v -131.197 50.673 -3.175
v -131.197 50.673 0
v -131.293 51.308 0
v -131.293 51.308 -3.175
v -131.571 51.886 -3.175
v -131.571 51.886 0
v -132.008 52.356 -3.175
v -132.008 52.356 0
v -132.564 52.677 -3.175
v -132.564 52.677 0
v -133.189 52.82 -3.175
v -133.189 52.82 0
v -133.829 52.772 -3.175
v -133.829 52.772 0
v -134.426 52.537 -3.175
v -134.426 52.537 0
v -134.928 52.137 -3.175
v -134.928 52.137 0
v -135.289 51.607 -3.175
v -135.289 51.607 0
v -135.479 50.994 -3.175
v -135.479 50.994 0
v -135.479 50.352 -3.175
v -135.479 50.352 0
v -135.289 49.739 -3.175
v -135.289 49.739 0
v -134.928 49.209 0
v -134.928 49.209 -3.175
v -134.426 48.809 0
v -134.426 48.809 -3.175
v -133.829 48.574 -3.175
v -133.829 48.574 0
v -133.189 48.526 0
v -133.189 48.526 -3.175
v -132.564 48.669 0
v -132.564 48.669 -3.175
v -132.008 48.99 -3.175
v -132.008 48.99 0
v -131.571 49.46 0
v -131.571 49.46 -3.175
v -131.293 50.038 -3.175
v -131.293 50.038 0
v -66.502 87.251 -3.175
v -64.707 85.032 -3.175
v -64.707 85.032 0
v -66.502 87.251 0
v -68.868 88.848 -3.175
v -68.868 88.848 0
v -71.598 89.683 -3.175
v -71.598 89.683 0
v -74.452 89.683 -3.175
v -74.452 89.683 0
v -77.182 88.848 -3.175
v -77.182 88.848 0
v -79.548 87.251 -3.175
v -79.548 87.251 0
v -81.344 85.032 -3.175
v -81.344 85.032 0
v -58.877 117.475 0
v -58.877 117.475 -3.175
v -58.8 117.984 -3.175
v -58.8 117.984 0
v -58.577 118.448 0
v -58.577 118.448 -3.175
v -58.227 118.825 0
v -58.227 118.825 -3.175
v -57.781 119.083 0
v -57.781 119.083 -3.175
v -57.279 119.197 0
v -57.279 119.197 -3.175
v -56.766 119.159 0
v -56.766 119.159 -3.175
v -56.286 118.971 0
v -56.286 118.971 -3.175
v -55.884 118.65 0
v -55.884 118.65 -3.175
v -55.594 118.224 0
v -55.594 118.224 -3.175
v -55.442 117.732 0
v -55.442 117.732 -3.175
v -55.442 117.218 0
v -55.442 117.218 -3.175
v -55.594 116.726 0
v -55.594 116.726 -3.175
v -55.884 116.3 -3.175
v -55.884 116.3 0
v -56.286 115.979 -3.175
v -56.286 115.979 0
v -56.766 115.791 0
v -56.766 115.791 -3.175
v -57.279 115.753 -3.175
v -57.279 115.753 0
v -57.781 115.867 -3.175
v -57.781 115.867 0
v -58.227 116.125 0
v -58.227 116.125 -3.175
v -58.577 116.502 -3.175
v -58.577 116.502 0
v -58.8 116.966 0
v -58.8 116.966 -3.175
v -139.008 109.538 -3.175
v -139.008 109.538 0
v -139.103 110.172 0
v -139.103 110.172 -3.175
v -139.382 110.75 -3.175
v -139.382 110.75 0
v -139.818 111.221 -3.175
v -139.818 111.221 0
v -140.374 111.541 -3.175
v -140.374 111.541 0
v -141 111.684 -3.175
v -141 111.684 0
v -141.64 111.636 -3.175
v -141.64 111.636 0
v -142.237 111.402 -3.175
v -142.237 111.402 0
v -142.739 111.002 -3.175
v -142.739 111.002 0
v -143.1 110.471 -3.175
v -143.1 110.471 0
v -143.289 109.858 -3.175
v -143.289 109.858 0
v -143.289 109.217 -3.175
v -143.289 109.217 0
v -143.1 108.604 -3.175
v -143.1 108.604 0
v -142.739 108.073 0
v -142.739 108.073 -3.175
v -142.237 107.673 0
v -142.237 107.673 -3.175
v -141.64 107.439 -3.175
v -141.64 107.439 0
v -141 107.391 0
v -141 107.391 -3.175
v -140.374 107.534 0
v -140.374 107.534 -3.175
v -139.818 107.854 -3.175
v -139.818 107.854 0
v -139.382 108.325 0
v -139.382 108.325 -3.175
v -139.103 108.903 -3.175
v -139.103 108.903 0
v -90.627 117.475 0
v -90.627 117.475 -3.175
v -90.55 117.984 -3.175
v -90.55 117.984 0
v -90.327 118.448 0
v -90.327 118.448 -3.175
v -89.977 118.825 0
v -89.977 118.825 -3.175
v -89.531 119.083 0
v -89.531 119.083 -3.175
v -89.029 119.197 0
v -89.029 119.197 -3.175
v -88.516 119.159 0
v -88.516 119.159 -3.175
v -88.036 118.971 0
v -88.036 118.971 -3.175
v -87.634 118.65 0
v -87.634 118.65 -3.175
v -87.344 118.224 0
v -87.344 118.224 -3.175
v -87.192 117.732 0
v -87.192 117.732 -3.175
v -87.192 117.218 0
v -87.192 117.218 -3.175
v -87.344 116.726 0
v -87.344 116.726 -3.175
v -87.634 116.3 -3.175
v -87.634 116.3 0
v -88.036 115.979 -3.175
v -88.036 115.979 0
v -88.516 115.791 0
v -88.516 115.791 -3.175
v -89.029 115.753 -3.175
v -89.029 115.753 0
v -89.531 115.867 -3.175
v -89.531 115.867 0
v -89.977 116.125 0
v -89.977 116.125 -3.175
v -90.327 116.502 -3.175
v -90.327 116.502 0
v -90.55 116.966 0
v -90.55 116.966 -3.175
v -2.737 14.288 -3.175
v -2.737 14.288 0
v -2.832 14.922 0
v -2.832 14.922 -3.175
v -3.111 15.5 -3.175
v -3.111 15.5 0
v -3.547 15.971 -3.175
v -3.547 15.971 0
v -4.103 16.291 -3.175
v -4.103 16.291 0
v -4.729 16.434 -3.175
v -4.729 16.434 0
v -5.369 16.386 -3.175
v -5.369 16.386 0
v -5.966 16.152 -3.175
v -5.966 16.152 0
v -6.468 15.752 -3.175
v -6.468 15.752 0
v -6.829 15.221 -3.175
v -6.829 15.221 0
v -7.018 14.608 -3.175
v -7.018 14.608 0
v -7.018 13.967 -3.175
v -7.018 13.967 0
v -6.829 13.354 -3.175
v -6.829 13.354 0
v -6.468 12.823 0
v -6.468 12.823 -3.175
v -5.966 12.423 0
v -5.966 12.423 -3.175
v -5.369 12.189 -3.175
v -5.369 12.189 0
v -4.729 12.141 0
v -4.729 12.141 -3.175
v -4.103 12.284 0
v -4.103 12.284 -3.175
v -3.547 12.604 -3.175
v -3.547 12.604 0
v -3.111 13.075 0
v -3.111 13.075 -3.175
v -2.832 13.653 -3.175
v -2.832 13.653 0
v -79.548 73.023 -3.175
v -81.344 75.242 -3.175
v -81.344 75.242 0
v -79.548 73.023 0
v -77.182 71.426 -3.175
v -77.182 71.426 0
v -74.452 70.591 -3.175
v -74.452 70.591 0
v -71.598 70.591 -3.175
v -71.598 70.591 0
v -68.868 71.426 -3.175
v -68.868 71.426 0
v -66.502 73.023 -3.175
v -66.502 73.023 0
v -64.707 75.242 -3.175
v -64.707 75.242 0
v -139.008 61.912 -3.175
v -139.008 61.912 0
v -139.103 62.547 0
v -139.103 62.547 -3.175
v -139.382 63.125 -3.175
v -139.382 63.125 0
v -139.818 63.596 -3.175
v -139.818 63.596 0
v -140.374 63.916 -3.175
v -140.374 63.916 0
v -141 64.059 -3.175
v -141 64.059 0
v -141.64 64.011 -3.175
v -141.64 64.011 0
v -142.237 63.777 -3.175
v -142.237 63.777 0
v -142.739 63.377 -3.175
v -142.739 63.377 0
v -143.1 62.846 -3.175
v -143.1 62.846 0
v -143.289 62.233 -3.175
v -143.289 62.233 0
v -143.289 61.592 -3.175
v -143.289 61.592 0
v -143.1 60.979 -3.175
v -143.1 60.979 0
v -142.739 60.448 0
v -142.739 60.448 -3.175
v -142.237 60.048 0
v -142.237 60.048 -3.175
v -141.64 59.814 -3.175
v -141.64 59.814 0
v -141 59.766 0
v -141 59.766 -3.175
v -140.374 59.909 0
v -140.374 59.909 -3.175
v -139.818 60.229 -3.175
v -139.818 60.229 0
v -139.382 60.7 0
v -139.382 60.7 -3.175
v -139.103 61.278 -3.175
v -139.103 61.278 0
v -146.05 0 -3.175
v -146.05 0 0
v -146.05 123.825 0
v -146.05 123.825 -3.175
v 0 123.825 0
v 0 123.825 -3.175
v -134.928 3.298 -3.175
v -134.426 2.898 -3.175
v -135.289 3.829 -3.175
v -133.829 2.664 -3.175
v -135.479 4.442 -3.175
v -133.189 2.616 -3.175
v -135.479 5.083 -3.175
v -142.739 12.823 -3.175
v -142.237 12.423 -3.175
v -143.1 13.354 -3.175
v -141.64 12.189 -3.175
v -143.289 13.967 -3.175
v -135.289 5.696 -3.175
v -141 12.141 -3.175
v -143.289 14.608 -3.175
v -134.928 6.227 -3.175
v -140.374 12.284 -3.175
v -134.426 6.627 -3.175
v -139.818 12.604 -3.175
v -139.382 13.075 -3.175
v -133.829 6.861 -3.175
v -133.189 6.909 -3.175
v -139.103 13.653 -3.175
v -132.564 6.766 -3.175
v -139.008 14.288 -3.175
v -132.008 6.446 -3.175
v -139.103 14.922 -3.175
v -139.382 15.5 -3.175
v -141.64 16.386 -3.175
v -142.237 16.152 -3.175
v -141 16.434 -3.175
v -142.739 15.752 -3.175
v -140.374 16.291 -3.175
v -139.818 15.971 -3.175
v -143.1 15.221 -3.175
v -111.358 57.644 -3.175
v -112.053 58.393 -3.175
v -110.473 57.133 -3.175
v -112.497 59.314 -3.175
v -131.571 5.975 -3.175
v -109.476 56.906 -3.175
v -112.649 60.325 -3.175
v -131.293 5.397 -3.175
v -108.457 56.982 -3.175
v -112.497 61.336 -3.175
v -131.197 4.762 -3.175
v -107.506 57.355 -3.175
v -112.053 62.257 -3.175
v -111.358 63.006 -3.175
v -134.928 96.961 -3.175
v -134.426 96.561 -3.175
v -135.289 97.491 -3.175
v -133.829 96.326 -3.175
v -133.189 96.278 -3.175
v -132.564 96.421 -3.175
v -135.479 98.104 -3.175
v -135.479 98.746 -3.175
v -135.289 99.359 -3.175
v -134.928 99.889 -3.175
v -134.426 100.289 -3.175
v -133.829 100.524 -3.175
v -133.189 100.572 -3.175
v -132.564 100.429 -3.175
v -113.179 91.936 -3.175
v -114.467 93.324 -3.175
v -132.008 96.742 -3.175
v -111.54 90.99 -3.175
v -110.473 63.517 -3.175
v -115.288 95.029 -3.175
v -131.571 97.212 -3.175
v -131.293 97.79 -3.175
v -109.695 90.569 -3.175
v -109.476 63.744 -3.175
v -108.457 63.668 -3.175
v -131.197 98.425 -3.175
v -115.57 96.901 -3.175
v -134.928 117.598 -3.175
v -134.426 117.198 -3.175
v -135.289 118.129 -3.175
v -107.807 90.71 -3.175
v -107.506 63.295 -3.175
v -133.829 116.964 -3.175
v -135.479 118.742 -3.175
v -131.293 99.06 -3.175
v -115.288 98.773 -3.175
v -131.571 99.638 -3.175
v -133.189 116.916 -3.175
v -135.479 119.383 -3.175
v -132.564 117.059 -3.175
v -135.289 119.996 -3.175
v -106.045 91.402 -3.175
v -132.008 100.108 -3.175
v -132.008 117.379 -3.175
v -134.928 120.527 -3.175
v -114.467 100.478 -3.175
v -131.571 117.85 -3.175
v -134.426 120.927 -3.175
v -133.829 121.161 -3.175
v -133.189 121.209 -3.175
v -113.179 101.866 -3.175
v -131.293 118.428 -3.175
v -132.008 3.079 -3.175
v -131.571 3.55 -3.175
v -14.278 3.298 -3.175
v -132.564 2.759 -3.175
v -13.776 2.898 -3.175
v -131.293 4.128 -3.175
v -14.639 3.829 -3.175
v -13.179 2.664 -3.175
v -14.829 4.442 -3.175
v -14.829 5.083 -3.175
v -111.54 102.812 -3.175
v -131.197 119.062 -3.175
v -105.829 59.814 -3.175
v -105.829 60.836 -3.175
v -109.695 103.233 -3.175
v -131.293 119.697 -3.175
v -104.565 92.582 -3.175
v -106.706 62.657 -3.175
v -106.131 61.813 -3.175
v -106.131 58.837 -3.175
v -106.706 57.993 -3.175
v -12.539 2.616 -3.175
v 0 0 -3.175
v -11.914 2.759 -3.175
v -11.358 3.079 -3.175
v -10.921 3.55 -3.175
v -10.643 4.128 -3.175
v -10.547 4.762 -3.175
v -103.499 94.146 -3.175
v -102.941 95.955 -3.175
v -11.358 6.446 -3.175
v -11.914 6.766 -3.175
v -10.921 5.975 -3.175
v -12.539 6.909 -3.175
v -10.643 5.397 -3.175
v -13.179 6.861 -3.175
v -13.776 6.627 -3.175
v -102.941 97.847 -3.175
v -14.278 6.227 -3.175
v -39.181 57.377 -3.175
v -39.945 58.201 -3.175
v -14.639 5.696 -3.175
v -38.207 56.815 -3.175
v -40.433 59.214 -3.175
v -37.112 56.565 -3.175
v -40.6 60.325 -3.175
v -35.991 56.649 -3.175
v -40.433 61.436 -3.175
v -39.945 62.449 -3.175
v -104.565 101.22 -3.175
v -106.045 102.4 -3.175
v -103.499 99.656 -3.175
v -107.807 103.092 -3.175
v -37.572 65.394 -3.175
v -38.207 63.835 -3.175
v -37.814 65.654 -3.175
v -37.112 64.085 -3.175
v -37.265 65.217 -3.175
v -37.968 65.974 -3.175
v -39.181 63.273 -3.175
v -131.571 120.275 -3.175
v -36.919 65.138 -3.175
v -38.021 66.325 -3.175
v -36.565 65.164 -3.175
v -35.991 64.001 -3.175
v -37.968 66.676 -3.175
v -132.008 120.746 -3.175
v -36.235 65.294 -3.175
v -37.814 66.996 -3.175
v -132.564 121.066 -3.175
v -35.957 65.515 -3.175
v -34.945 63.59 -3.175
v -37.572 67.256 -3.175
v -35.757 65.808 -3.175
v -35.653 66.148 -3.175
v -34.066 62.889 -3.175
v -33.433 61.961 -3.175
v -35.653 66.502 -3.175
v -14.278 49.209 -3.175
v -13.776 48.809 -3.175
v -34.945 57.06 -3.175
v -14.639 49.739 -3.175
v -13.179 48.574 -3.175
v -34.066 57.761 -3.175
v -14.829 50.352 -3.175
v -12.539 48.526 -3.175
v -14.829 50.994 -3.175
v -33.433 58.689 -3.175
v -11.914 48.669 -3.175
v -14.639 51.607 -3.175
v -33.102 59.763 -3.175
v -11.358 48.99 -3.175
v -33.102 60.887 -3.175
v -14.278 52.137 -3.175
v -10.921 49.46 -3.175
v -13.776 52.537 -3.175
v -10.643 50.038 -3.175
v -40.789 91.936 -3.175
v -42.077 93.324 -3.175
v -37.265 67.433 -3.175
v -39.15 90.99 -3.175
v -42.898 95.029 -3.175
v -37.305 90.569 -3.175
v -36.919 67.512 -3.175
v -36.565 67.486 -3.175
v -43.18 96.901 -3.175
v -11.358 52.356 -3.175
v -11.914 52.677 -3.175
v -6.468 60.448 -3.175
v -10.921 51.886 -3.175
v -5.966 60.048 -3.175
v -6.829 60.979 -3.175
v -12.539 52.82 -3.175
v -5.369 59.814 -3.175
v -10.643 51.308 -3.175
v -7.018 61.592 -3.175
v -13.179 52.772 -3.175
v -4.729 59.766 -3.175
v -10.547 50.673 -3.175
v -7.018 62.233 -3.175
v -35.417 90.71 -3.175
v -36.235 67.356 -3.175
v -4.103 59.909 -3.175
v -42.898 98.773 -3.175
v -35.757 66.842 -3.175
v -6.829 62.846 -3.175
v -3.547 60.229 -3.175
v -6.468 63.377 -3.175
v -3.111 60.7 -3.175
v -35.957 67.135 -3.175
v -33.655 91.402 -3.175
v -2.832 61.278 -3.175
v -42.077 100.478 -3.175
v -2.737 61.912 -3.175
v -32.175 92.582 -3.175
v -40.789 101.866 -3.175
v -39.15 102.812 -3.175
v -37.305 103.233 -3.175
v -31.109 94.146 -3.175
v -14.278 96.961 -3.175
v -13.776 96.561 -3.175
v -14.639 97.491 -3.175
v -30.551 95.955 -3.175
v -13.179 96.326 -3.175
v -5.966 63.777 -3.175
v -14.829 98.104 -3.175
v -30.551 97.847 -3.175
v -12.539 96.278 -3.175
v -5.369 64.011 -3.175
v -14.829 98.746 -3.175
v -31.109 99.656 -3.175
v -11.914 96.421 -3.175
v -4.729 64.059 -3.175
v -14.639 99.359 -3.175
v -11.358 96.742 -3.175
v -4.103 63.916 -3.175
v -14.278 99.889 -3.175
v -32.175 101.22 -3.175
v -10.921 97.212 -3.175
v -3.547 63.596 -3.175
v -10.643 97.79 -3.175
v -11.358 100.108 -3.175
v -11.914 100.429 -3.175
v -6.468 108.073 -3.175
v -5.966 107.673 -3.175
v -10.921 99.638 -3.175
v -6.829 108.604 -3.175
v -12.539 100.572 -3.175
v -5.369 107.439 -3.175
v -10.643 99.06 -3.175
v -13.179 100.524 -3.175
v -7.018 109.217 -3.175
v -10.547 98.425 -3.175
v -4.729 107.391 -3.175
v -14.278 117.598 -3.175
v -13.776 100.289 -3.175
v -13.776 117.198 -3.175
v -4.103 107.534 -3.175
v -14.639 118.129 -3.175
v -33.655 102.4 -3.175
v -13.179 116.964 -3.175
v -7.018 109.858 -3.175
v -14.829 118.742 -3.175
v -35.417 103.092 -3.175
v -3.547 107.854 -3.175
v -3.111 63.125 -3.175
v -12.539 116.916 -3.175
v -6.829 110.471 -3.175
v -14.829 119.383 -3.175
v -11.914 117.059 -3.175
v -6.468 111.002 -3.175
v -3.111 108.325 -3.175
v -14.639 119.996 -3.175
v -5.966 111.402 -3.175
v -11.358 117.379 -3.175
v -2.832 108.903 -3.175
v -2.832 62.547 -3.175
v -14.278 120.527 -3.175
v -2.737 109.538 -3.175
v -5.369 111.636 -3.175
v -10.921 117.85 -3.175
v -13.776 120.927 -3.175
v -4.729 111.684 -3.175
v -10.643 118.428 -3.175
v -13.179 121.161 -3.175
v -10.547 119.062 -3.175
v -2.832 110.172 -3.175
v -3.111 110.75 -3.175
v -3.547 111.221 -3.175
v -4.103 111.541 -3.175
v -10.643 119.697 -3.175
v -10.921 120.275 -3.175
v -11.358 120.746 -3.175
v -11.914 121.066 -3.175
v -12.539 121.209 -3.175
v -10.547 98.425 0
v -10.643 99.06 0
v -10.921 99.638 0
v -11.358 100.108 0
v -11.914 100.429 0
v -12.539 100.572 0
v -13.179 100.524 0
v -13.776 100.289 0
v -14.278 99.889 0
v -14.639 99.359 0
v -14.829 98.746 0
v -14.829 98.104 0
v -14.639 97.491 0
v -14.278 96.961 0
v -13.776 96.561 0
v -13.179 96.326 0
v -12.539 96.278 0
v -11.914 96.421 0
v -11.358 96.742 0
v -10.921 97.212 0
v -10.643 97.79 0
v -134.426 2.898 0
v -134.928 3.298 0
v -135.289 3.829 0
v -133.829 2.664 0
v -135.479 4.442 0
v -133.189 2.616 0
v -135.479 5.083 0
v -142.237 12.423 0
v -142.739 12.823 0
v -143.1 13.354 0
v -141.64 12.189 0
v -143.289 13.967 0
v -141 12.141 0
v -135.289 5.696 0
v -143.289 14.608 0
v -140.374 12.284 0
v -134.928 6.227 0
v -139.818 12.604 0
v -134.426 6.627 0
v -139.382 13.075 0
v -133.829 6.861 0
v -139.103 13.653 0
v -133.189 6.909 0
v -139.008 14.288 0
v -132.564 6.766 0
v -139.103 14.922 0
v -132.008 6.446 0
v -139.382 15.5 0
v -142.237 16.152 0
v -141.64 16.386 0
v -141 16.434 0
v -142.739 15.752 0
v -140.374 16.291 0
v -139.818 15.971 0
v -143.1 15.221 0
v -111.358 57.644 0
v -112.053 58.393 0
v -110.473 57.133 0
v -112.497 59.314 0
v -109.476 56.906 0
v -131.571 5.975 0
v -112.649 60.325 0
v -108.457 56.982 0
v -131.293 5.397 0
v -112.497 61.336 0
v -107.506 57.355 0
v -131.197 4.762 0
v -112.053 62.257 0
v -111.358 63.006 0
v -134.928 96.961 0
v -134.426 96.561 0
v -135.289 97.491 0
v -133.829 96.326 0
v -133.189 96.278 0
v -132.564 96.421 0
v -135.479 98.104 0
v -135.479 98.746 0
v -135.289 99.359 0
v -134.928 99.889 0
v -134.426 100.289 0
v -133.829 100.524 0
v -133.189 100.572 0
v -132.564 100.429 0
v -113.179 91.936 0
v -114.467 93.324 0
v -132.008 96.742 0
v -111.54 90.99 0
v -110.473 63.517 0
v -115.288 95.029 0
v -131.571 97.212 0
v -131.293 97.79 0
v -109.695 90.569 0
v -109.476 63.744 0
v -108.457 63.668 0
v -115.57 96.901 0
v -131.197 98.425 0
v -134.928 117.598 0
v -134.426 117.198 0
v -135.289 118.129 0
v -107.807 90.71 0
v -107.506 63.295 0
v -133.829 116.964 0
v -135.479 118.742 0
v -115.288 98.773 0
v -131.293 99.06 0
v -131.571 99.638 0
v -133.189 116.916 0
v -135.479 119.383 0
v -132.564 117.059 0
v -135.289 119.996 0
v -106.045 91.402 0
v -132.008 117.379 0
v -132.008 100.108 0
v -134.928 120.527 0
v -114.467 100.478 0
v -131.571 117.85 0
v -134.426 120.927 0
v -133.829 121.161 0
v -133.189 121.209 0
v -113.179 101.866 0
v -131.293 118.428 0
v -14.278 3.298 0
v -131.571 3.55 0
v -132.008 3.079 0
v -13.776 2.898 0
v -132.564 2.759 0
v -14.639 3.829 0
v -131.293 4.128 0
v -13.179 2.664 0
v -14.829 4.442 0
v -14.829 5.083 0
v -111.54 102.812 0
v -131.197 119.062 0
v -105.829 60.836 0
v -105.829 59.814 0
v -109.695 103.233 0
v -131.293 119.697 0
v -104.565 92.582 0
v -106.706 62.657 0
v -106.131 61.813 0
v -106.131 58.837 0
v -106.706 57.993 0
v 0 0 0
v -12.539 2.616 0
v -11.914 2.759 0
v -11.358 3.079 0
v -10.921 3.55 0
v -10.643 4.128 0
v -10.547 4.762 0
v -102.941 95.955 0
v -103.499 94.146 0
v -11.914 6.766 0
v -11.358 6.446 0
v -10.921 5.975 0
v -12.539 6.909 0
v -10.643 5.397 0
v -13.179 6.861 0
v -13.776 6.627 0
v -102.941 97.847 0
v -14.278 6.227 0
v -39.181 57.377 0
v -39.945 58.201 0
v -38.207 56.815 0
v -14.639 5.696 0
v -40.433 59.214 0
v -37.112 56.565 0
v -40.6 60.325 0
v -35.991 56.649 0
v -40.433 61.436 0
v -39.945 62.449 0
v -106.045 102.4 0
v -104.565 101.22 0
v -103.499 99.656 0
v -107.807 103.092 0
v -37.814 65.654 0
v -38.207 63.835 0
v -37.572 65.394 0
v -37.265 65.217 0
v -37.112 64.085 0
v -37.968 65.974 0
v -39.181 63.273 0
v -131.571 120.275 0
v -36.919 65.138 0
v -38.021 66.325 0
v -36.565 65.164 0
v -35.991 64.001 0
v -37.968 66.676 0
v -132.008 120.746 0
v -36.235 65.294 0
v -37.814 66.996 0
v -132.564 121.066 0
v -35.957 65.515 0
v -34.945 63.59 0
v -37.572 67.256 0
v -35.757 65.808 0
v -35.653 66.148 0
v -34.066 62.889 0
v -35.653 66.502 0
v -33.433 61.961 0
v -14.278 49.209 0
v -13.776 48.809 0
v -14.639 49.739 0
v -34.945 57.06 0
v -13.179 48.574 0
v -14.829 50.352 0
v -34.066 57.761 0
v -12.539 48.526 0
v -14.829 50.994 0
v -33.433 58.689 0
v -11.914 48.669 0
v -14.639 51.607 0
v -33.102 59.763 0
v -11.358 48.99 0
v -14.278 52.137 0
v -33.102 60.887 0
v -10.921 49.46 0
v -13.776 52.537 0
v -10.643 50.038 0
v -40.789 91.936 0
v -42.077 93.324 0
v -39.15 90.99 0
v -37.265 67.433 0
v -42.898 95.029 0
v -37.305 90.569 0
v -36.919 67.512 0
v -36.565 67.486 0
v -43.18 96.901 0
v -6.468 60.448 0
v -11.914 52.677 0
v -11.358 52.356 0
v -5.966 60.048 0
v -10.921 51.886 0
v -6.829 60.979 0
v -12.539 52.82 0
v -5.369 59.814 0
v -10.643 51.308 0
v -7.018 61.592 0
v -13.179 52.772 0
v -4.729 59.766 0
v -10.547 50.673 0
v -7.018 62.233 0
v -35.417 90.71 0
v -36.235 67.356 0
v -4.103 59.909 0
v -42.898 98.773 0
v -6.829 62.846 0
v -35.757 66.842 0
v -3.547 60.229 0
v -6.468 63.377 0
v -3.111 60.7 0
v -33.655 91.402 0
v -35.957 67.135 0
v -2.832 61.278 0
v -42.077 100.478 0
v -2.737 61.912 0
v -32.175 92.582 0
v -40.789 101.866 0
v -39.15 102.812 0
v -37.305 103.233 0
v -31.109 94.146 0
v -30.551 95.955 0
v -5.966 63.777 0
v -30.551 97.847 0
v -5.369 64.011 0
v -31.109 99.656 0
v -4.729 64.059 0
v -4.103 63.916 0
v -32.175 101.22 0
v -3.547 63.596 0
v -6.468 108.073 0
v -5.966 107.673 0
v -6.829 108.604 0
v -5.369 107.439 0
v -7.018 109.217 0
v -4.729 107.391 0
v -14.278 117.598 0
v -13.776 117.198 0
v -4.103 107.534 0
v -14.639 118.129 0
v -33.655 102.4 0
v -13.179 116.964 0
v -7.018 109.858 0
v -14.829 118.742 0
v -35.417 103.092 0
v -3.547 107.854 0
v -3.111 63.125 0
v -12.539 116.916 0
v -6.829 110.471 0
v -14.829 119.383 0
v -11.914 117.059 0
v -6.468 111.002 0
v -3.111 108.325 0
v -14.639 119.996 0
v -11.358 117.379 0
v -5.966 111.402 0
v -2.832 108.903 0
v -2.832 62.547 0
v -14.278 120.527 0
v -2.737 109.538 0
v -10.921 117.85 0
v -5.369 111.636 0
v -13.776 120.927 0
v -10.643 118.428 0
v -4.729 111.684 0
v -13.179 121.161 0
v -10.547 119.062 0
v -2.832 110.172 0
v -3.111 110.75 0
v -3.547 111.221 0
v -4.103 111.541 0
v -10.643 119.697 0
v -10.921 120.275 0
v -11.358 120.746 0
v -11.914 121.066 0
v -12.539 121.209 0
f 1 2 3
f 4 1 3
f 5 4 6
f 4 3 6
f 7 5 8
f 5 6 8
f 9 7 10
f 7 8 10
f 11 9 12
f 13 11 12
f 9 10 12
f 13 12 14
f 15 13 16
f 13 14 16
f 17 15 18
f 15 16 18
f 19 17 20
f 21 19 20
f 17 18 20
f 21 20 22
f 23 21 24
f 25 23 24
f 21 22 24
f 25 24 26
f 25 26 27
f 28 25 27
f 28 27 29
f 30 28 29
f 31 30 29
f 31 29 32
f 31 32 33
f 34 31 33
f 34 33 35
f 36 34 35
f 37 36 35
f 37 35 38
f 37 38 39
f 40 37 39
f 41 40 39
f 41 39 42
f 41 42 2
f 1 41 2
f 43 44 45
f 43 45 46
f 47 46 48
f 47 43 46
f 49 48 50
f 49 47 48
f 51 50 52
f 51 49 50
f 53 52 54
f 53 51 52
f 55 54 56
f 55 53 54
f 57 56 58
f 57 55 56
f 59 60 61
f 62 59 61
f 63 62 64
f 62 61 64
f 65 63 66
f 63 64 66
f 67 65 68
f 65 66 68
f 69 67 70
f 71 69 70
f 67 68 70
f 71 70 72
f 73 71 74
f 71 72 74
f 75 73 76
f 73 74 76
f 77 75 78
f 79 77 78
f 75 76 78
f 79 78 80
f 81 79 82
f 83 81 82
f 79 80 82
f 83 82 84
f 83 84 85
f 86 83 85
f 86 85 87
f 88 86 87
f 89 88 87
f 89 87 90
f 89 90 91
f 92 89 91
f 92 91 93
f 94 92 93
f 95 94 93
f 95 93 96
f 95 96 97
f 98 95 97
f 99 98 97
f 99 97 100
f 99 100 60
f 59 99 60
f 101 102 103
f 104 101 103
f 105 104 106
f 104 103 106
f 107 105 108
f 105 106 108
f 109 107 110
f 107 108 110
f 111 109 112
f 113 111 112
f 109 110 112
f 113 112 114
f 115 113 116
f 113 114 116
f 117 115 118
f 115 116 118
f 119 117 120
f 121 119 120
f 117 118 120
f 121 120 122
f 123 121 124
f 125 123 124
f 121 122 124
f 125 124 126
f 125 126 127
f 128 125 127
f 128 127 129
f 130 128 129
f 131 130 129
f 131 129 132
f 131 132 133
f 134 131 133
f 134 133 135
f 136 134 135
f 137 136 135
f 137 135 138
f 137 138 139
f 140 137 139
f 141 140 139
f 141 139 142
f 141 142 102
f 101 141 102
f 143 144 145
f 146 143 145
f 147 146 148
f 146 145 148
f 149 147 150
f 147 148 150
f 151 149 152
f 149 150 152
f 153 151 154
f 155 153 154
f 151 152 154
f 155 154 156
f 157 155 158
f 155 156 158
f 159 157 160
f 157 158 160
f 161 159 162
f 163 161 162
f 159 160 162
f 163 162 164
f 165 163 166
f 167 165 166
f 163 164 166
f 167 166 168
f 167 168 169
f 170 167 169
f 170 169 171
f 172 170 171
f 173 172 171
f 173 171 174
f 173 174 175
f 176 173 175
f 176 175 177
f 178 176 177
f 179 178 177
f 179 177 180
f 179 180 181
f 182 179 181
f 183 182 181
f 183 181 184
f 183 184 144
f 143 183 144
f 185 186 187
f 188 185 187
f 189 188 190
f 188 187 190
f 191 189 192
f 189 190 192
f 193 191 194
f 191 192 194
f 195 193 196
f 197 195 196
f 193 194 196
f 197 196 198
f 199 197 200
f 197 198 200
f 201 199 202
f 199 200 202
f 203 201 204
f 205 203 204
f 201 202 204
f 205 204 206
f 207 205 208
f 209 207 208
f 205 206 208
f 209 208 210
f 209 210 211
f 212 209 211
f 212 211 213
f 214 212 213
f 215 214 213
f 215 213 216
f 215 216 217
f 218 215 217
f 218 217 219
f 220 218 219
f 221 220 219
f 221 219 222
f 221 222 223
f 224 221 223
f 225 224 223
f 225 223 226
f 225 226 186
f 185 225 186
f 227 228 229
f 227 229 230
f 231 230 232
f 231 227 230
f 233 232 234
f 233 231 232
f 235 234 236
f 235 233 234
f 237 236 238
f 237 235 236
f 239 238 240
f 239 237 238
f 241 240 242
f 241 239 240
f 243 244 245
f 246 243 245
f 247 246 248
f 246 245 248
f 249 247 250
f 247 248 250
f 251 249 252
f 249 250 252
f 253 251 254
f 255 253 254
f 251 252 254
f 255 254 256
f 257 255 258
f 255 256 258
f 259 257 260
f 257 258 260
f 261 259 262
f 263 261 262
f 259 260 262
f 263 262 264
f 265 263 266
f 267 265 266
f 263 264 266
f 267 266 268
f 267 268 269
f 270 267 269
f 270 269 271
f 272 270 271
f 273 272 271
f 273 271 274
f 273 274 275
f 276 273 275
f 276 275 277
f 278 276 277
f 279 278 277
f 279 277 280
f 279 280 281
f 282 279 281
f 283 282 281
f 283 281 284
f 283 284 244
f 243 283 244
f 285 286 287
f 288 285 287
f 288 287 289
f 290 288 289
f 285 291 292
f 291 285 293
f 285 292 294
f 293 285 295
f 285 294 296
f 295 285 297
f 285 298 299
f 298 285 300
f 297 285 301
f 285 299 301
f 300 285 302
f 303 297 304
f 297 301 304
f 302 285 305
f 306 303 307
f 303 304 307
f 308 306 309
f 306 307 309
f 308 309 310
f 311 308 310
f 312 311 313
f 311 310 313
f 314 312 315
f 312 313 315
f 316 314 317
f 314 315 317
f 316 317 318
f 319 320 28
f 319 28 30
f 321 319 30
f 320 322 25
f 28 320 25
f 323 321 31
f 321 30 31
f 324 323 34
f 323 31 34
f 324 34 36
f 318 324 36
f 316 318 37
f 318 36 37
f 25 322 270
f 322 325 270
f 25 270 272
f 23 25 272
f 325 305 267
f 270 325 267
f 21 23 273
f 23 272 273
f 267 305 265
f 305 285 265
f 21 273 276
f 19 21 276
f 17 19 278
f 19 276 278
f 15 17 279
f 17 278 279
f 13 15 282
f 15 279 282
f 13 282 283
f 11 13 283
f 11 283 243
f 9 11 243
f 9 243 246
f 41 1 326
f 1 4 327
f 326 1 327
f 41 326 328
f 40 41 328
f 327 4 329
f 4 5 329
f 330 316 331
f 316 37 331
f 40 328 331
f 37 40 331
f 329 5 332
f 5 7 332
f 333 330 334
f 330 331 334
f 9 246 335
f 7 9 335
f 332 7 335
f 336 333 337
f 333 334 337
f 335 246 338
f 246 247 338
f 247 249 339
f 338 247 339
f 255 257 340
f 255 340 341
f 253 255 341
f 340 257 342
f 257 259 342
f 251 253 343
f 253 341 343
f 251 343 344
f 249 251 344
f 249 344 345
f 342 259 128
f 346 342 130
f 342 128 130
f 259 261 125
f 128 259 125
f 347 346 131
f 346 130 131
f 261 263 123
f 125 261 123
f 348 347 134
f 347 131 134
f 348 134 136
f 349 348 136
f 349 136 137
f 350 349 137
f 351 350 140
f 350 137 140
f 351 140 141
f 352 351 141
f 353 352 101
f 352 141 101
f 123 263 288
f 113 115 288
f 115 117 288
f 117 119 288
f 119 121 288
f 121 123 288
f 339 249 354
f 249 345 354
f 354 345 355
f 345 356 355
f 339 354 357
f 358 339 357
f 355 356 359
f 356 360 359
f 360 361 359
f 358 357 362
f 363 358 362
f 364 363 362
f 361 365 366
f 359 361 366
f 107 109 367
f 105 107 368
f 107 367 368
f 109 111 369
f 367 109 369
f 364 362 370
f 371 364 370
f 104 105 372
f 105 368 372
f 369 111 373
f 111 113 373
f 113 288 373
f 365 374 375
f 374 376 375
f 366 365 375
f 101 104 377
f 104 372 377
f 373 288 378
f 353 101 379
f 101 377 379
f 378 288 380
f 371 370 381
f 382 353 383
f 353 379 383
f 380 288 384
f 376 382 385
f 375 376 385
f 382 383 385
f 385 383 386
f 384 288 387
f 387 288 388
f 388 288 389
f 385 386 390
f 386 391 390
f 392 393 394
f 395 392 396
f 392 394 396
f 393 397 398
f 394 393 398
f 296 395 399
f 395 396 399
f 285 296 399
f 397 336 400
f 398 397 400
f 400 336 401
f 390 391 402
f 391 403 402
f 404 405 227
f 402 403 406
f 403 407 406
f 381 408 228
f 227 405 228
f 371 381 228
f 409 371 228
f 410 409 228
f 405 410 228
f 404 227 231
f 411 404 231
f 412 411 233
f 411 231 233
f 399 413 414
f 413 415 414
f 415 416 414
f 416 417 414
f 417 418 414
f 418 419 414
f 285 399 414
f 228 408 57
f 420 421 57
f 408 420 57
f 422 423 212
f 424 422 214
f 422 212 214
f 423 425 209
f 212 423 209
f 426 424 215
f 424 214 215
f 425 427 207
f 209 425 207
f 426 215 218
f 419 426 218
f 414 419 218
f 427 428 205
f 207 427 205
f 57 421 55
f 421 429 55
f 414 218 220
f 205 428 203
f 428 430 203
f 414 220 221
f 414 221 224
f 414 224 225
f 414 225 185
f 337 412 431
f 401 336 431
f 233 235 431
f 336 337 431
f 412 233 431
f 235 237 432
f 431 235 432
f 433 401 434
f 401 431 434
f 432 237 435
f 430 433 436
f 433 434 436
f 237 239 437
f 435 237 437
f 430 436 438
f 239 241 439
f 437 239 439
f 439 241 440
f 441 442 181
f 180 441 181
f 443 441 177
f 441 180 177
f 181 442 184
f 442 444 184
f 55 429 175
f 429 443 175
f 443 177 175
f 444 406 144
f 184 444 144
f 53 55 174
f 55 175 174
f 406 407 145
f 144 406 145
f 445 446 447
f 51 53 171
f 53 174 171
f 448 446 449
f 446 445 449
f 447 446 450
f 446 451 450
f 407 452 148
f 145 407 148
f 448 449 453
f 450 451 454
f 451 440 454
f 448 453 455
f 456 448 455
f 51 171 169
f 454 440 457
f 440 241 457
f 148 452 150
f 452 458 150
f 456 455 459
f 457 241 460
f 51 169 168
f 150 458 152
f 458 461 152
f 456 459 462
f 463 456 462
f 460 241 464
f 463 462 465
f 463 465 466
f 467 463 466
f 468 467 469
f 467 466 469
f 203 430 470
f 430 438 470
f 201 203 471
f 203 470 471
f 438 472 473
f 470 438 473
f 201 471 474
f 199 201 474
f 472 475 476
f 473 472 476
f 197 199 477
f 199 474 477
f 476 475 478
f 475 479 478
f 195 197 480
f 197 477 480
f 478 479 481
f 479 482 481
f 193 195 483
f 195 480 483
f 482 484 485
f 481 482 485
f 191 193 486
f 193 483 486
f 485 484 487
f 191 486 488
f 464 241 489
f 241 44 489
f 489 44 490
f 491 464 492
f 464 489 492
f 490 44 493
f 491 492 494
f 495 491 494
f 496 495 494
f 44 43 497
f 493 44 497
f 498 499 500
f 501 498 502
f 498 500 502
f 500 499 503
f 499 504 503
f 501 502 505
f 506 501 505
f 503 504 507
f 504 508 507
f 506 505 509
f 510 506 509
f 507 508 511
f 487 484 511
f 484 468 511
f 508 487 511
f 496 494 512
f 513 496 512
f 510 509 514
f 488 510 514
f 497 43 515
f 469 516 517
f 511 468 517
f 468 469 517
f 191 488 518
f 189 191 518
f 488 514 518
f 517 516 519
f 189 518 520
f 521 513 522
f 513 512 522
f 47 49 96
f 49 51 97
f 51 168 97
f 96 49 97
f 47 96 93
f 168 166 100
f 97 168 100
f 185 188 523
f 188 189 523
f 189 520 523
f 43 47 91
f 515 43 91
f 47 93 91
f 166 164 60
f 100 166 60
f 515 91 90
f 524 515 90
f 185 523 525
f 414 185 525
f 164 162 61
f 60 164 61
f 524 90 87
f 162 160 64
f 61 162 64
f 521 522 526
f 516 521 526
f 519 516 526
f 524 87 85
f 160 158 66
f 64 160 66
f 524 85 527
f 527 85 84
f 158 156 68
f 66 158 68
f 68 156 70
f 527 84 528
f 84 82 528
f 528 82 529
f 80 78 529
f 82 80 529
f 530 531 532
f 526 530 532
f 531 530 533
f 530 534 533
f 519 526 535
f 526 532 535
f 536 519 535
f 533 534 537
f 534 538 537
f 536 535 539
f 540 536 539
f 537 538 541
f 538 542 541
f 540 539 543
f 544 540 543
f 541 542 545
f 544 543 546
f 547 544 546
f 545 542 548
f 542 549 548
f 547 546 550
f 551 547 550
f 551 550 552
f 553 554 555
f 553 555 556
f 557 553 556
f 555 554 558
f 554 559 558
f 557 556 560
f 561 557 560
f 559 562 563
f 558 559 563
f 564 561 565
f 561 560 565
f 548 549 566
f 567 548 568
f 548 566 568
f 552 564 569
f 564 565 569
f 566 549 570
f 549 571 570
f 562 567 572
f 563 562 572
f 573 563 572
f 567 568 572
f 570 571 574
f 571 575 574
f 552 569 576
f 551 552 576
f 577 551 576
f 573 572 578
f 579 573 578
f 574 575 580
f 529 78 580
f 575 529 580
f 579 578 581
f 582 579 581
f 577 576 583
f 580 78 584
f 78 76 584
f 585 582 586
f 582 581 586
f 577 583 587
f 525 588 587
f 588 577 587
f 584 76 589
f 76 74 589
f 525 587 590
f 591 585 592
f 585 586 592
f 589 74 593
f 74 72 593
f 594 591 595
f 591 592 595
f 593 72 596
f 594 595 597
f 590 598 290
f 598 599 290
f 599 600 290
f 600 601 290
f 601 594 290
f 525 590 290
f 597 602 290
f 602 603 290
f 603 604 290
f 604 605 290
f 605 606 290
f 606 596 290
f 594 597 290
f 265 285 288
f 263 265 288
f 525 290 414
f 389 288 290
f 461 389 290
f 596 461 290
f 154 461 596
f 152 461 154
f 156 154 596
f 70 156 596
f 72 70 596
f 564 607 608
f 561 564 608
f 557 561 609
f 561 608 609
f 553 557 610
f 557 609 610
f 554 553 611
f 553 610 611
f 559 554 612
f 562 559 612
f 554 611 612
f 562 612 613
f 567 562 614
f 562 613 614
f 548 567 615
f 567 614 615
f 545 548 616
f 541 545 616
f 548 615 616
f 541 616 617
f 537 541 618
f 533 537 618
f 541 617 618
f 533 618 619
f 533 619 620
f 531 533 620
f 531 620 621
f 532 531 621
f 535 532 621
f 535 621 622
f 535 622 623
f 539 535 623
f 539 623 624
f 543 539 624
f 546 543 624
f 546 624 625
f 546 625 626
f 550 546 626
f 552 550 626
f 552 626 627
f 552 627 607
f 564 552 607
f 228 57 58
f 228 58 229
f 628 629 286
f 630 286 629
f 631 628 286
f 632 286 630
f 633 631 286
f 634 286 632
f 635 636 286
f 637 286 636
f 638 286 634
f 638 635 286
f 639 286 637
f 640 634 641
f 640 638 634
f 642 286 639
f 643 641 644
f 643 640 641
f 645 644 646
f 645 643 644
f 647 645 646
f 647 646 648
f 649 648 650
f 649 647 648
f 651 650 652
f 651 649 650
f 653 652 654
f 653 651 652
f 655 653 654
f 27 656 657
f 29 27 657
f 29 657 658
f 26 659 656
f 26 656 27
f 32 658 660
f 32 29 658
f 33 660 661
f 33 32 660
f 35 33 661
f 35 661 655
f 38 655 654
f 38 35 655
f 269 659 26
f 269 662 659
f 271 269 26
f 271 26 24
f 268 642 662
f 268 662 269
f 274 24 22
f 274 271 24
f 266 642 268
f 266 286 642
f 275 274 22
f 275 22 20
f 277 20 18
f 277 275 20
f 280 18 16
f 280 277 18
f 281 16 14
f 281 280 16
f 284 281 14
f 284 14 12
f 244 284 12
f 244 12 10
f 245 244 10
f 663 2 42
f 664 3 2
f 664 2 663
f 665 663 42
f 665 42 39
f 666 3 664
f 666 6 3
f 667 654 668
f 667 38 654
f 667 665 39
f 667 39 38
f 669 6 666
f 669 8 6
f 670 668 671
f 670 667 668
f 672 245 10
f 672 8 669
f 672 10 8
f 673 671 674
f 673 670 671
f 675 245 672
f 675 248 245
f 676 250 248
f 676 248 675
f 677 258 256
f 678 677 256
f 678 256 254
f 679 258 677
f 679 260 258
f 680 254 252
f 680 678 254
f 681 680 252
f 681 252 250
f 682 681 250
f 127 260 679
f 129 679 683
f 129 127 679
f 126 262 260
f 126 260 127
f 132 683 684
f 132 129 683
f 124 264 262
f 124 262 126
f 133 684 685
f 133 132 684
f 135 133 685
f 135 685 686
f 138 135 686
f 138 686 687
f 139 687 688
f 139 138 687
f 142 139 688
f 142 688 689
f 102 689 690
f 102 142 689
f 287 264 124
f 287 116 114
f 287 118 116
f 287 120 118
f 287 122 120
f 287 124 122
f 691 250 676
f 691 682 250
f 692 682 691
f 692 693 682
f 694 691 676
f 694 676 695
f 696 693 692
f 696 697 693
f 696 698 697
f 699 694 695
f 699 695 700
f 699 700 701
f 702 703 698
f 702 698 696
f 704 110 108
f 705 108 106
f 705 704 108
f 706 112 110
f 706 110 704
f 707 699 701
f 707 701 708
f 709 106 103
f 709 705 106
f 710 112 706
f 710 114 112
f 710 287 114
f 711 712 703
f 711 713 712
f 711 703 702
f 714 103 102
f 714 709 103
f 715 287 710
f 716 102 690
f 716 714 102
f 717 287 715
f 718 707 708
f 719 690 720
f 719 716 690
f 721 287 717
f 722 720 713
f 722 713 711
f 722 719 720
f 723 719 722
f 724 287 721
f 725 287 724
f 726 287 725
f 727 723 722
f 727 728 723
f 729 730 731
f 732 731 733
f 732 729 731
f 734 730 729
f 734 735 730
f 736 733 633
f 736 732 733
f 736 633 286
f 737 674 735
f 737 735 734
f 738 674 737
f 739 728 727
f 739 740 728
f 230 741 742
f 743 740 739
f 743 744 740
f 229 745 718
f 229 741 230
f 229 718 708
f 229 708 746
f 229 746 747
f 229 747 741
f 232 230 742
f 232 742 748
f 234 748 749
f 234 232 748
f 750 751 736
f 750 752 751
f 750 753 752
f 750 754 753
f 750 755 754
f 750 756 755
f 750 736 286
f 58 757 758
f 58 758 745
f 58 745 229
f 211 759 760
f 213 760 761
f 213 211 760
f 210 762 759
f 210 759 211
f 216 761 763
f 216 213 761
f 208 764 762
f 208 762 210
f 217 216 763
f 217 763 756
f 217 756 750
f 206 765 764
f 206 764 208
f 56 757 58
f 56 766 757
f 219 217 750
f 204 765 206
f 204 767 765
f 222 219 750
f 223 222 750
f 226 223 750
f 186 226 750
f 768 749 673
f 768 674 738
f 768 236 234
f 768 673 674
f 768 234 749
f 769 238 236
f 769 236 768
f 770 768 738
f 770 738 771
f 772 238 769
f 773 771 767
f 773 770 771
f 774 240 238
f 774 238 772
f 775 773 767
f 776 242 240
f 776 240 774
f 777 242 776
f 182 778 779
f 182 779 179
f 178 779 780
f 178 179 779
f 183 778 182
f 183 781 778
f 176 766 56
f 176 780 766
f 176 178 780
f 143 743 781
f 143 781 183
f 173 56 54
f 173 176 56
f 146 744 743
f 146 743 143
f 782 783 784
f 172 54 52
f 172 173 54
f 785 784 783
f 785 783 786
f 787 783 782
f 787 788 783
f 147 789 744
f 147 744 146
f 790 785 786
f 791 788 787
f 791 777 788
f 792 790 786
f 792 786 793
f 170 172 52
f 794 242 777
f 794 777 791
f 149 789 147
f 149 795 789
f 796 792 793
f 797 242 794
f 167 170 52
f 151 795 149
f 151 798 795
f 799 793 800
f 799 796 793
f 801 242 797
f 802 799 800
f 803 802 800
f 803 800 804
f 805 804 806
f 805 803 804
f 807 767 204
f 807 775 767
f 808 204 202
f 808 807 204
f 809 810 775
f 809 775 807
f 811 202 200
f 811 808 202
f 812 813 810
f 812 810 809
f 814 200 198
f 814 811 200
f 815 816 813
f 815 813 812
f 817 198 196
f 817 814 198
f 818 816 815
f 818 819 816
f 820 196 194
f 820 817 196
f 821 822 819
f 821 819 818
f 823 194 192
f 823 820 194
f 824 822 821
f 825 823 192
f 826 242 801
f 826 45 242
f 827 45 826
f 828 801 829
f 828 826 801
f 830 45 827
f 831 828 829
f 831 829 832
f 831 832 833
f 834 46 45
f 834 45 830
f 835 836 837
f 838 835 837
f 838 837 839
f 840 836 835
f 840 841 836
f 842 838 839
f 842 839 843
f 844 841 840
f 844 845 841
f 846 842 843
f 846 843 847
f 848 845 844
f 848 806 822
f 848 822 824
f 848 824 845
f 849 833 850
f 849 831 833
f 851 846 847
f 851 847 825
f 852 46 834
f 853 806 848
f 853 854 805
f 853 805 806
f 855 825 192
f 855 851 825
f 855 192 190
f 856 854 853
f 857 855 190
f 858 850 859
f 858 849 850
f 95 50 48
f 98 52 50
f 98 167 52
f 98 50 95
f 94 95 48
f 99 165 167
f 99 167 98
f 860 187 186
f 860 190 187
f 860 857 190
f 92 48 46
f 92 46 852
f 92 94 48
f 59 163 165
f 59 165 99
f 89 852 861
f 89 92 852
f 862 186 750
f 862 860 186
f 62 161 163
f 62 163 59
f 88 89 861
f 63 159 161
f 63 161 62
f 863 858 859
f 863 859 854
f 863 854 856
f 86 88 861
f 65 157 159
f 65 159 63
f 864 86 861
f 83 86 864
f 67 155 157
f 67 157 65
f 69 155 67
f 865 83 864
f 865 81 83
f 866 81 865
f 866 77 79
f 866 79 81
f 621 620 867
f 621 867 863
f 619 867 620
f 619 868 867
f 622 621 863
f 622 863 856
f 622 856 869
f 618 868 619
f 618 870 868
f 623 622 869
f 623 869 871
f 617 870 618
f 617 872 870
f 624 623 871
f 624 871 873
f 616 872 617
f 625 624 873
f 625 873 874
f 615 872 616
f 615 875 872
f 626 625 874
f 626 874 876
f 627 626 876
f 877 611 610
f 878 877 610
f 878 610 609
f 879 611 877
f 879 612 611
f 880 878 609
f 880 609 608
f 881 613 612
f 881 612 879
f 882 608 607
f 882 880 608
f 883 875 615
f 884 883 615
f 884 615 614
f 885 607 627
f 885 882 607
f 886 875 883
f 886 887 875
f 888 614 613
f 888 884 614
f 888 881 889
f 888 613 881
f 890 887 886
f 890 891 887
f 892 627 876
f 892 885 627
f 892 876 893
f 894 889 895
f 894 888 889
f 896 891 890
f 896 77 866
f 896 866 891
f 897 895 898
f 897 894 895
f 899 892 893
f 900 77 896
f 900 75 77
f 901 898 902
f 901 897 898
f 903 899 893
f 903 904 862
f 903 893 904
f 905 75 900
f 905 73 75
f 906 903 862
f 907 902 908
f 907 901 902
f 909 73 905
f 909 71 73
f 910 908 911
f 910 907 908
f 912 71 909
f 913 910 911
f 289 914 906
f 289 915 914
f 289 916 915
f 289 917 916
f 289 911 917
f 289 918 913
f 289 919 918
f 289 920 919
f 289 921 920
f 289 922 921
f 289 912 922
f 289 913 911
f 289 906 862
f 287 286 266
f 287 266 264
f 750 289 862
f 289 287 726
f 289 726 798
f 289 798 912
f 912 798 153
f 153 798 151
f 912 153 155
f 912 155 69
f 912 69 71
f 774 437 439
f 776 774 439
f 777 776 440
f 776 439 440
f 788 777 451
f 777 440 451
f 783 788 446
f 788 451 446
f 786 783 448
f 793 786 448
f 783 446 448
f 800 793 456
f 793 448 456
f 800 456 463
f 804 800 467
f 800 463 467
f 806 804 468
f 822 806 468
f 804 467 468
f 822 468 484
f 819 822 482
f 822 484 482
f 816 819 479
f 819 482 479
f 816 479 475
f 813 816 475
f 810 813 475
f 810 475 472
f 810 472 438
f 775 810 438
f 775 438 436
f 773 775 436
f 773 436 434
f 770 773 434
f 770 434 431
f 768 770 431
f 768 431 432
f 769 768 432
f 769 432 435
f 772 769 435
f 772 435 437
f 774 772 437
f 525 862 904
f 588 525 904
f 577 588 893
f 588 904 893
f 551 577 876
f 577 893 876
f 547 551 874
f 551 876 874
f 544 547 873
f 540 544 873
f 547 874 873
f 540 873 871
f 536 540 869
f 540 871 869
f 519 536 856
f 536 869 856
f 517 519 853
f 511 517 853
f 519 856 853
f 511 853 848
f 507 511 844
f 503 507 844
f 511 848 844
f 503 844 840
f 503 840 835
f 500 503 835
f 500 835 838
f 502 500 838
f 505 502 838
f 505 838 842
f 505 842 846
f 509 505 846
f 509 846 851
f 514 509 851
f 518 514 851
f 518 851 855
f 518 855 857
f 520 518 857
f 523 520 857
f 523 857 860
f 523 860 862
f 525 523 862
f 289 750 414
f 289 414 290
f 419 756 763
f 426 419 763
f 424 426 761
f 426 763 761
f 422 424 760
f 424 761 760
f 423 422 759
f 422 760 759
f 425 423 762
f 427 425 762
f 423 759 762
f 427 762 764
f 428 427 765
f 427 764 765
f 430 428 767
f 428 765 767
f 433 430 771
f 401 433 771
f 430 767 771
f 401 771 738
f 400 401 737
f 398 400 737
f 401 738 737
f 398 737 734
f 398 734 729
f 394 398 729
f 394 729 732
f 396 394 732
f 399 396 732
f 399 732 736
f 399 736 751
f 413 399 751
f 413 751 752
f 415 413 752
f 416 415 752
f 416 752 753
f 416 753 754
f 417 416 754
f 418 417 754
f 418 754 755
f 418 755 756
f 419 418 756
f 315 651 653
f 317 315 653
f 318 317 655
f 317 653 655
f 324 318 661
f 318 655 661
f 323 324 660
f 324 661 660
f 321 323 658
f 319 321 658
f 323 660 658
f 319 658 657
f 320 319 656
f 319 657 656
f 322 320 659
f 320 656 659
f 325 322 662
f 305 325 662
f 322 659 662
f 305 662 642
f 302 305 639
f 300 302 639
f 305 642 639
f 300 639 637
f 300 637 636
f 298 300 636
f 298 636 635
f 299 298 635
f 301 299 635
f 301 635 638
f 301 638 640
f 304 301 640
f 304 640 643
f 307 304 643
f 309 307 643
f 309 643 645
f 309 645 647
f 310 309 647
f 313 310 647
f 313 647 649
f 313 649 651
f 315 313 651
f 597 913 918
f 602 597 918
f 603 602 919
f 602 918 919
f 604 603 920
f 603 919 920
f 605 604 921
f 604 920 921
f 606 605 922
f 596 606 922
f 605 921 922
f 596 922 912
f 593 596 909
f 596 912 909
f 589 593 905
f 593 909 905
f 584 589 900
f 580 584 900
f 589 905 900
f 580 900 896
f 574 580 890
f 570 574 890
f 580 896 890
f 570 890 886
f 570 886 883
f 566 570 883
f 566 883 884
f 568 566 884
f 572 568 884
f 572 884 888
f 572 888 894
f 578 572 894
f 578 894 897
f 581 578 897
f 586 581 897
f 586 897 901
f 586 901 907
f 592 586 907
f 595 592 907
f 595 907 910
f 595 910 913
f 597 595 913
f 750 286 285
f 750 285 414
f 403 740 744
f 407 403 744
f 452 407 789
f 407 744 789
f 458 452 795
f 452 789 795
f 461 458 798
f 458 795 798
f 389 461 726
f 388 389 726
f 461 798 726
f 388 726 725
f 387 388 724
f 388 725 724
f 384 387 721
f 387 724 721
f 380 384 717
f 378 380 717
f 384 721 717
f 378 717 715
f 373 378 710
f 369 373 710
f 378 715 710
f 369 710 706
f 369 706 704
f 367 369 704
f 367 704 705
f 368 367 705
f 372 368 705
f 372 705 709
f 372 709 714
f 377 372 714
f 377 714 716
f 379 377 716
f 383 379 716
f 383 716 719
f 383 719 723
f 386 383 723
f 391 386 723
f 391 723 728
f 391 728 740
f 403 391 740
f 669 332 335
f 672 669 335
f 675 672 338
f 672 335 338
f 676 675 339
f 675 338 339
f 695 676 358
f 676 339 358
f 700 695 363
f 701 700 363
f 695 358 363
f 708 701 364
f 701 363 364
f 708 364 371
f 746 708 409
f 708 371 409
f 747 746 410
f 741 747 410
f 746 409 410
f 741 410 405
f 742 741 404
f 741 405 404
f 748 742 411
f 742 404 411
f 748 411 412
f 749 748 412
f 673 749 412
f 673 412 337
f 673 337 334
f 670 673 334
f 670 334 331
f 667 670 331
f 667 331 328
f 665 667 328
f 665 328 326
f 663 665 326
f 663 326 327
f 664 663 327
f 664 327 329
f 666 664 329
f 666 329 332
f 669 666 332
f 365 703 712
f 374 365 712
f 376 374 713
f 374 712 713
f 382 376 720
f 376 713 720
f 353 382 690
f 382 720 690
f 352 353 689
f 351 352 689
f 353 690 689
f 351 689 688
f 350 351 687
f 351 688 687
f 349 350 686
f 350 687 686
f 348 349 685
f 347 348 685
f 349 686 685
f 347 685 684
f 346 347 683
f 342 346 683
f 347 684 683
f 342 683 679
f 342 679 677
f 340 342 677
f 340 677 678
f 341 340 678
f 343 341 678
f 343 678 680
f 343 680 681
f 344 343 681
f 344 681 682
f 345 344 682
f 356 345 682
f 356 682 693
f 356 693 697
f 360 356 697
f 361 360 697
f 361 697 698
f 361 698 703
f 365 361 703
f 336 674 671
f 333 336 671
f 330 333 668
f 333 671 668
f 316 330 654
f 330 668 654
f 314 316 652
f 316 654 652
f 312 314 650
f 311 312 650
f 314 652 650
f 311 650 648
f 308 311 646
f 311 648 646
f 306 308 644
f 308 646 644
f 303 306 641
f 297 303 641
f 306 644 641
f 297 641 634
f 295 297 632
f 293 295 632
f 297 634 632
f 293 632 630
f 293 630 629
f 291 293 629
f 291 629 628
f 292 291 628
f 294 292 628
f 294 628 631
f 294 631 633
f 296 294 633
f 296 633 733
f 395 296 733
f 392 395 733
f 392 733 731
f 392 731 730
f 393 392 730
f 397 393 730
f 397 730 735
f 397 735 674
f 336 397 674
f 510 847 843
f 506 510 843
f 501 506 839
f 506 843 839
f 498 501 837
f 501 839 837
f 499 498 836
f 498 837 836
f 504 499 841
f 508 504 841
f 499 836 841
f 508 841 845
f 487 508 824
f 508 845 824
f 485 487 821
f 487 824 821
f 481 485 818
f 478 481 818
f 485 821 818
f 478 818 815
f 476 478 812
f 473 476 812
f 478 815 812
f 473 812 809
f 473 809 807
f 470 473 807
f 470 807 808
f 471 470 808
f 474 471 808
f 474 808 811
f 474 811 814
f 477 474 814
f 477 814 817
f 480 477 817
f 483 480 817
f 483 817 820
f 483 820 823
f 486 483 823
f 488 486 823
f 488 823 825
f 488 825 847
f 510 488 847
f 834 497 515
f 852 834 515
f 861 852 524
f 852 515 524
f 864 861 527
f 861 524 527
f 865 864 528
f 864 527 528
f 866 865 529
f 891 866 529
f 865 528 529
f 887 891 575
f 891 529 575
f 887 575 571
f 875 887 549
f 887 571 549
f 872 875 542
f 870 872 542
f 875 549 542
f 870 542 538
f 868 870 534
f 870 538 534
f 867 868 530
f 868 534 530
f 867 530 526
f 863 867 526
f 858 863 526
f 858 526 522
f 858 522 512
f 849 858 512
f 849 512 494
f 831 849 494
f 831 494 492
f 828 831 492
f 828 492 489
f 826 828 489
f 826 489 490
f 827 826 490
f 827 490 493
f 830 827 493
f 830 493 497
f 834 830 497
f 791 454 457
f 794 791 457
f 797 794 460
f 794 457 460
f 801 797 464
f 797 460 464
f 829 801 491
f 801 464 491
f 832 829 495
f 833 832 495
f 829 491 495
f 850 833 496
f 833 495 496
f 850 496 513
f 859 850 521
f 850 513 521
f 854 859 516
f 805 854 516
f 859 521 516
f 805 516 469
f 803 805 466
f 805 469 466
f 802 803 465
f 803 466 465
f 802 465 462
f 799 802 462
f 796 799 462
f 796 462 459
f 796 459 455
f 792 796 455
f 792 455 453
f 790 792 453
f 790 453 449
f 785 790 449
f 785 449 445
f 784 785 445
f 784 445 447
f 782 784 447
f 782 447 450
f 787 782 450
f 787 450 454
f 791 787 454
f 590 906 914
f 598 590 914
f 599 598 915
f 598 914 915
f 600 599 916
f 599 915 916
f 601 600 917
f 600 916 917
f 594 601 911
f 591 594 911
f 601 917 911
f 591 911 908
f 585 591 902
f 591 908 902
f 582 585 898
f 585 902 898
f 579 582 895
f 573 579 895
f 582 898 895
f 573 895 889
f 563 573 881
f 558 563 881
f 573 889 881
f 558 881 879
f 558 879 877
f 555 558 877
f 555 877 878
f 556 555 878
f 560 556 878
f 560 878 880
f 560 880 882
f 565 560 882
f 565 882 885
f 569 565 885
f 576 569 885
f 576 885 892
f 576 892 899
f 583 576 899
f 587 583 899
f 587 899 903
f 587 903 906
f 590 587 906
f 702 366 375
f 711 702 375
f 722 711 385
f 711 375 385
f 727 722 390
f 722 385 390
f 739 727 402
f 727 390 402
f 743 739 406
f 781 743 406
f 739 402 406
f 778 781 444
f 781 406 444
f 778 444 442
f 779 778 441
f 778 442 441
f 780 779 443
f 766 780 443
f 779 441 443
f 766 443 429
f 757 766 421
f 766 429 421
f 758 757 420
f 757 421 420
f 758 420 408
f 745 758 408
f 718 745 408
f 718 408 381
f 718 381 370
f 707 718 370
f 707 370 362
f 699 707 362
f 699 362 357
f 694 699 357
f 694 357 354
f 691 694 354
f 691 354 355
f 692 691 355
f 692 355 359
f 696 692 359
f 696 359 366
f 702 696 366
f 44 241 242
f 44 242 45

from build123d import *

# Parameters (mm, degrees)
SKETCH1_W             = 146.05
SKETCH1_H             = 123.825
BOSS_EXTRUDE1_DEPTH   = 3.175
F_6_CLEARANCE_HOLE1_D = 4.3053
SKETCH4_R             = 6.35
SKETCH4_R_2           = 3.7703125
SKETCH4_R_3           = 3.429
SKETCH4_R_4           = 1.190625
CUT_EXTRUDE1_DEPTH    = 4.175
F_4_CLEARANCE_HOLE1_D = 3.4544


with BuildPart() as part:
    # Sketch1 → Boss-Extrude1 (new body)
    with BuildSketch(Plane.XY):
        with Locations((-73.025, 61.9125)):
            Rectangle(SKETCH1_W, SKETCH1_H)
    extrude(amount=-BOSS_EXTRUDE1_DEPTH)

    # #6 Clearance Hole1 (through all)
    with Locations(Plane(origin=(0, 0, -3.175), x_dir=(-1, 0, 0), z_dir=(0, 0, -1))):
        with Locations((12.7, 119.0625), (133.35, 119.0625), (141.1605, 109.5375), (133.35, 98.425), (141.1605, 61.9125), (133.35, 50.673), (133.35, 4.7625), (12.7, 4.7625), (12.7, 50.673), (12.7, 98.425), (4.8895, 109.5375), (141.1605, 14.2875), (4.8895, 14.2875), (4.8895, 61.9125)):
            Hole(F_6_CLEARANCE_HOLE1_D / 2)

    # Sketch4 → Cut-Extrude1 (cut, through all)
    with BuildSketch(Plane(origin=(0, 0, -3.175), x_dir=(-1, 0, 0), z_dir=(0, 0, -1))):
        with Locations((36.83, 96.901)):
            Circle(SKETCH4_R)
        with Locations((36.83, 60.325)):
            Circle(SKETCH4_R_2)
        with Locations((109.22, 60.325)):
            Circle(SKETCH4_R_3)
        with Locations((109.22, 96.901)):
            Circle(SKETCH4_R)
        with Locations((36.830000026, 66.325)):
            Circle(SKETCH4_R_4)
        with BuildLine():
            Line((81.3435, 85.032269324), (81.3435, 75.241730676))
            ThreePointArc((81.3435, 75.241730676), (73.025, 70.485), (64.7065, 75.241730676))
            Line((64.7065, 75.241730676), (64.7065, 85.032269324))
            ThreePointArc((64.7065, 85.032269324), (73.025, 89.789), (81.3435, 85.032269324))
        make_face()
    extrude(amount=-CUT_EXTRUDE1_DEPTH, mode=Mode.SUBTRACT)

    # #4 Clearance Hole1 (through all)
    with Locations(Plane.XY):
        with Locations((-88.9, 117.475), (-57.15, 117.475)):
            Hole(F_4_CLEARANCE_HOLE1_D / 2)


solid = part.part
